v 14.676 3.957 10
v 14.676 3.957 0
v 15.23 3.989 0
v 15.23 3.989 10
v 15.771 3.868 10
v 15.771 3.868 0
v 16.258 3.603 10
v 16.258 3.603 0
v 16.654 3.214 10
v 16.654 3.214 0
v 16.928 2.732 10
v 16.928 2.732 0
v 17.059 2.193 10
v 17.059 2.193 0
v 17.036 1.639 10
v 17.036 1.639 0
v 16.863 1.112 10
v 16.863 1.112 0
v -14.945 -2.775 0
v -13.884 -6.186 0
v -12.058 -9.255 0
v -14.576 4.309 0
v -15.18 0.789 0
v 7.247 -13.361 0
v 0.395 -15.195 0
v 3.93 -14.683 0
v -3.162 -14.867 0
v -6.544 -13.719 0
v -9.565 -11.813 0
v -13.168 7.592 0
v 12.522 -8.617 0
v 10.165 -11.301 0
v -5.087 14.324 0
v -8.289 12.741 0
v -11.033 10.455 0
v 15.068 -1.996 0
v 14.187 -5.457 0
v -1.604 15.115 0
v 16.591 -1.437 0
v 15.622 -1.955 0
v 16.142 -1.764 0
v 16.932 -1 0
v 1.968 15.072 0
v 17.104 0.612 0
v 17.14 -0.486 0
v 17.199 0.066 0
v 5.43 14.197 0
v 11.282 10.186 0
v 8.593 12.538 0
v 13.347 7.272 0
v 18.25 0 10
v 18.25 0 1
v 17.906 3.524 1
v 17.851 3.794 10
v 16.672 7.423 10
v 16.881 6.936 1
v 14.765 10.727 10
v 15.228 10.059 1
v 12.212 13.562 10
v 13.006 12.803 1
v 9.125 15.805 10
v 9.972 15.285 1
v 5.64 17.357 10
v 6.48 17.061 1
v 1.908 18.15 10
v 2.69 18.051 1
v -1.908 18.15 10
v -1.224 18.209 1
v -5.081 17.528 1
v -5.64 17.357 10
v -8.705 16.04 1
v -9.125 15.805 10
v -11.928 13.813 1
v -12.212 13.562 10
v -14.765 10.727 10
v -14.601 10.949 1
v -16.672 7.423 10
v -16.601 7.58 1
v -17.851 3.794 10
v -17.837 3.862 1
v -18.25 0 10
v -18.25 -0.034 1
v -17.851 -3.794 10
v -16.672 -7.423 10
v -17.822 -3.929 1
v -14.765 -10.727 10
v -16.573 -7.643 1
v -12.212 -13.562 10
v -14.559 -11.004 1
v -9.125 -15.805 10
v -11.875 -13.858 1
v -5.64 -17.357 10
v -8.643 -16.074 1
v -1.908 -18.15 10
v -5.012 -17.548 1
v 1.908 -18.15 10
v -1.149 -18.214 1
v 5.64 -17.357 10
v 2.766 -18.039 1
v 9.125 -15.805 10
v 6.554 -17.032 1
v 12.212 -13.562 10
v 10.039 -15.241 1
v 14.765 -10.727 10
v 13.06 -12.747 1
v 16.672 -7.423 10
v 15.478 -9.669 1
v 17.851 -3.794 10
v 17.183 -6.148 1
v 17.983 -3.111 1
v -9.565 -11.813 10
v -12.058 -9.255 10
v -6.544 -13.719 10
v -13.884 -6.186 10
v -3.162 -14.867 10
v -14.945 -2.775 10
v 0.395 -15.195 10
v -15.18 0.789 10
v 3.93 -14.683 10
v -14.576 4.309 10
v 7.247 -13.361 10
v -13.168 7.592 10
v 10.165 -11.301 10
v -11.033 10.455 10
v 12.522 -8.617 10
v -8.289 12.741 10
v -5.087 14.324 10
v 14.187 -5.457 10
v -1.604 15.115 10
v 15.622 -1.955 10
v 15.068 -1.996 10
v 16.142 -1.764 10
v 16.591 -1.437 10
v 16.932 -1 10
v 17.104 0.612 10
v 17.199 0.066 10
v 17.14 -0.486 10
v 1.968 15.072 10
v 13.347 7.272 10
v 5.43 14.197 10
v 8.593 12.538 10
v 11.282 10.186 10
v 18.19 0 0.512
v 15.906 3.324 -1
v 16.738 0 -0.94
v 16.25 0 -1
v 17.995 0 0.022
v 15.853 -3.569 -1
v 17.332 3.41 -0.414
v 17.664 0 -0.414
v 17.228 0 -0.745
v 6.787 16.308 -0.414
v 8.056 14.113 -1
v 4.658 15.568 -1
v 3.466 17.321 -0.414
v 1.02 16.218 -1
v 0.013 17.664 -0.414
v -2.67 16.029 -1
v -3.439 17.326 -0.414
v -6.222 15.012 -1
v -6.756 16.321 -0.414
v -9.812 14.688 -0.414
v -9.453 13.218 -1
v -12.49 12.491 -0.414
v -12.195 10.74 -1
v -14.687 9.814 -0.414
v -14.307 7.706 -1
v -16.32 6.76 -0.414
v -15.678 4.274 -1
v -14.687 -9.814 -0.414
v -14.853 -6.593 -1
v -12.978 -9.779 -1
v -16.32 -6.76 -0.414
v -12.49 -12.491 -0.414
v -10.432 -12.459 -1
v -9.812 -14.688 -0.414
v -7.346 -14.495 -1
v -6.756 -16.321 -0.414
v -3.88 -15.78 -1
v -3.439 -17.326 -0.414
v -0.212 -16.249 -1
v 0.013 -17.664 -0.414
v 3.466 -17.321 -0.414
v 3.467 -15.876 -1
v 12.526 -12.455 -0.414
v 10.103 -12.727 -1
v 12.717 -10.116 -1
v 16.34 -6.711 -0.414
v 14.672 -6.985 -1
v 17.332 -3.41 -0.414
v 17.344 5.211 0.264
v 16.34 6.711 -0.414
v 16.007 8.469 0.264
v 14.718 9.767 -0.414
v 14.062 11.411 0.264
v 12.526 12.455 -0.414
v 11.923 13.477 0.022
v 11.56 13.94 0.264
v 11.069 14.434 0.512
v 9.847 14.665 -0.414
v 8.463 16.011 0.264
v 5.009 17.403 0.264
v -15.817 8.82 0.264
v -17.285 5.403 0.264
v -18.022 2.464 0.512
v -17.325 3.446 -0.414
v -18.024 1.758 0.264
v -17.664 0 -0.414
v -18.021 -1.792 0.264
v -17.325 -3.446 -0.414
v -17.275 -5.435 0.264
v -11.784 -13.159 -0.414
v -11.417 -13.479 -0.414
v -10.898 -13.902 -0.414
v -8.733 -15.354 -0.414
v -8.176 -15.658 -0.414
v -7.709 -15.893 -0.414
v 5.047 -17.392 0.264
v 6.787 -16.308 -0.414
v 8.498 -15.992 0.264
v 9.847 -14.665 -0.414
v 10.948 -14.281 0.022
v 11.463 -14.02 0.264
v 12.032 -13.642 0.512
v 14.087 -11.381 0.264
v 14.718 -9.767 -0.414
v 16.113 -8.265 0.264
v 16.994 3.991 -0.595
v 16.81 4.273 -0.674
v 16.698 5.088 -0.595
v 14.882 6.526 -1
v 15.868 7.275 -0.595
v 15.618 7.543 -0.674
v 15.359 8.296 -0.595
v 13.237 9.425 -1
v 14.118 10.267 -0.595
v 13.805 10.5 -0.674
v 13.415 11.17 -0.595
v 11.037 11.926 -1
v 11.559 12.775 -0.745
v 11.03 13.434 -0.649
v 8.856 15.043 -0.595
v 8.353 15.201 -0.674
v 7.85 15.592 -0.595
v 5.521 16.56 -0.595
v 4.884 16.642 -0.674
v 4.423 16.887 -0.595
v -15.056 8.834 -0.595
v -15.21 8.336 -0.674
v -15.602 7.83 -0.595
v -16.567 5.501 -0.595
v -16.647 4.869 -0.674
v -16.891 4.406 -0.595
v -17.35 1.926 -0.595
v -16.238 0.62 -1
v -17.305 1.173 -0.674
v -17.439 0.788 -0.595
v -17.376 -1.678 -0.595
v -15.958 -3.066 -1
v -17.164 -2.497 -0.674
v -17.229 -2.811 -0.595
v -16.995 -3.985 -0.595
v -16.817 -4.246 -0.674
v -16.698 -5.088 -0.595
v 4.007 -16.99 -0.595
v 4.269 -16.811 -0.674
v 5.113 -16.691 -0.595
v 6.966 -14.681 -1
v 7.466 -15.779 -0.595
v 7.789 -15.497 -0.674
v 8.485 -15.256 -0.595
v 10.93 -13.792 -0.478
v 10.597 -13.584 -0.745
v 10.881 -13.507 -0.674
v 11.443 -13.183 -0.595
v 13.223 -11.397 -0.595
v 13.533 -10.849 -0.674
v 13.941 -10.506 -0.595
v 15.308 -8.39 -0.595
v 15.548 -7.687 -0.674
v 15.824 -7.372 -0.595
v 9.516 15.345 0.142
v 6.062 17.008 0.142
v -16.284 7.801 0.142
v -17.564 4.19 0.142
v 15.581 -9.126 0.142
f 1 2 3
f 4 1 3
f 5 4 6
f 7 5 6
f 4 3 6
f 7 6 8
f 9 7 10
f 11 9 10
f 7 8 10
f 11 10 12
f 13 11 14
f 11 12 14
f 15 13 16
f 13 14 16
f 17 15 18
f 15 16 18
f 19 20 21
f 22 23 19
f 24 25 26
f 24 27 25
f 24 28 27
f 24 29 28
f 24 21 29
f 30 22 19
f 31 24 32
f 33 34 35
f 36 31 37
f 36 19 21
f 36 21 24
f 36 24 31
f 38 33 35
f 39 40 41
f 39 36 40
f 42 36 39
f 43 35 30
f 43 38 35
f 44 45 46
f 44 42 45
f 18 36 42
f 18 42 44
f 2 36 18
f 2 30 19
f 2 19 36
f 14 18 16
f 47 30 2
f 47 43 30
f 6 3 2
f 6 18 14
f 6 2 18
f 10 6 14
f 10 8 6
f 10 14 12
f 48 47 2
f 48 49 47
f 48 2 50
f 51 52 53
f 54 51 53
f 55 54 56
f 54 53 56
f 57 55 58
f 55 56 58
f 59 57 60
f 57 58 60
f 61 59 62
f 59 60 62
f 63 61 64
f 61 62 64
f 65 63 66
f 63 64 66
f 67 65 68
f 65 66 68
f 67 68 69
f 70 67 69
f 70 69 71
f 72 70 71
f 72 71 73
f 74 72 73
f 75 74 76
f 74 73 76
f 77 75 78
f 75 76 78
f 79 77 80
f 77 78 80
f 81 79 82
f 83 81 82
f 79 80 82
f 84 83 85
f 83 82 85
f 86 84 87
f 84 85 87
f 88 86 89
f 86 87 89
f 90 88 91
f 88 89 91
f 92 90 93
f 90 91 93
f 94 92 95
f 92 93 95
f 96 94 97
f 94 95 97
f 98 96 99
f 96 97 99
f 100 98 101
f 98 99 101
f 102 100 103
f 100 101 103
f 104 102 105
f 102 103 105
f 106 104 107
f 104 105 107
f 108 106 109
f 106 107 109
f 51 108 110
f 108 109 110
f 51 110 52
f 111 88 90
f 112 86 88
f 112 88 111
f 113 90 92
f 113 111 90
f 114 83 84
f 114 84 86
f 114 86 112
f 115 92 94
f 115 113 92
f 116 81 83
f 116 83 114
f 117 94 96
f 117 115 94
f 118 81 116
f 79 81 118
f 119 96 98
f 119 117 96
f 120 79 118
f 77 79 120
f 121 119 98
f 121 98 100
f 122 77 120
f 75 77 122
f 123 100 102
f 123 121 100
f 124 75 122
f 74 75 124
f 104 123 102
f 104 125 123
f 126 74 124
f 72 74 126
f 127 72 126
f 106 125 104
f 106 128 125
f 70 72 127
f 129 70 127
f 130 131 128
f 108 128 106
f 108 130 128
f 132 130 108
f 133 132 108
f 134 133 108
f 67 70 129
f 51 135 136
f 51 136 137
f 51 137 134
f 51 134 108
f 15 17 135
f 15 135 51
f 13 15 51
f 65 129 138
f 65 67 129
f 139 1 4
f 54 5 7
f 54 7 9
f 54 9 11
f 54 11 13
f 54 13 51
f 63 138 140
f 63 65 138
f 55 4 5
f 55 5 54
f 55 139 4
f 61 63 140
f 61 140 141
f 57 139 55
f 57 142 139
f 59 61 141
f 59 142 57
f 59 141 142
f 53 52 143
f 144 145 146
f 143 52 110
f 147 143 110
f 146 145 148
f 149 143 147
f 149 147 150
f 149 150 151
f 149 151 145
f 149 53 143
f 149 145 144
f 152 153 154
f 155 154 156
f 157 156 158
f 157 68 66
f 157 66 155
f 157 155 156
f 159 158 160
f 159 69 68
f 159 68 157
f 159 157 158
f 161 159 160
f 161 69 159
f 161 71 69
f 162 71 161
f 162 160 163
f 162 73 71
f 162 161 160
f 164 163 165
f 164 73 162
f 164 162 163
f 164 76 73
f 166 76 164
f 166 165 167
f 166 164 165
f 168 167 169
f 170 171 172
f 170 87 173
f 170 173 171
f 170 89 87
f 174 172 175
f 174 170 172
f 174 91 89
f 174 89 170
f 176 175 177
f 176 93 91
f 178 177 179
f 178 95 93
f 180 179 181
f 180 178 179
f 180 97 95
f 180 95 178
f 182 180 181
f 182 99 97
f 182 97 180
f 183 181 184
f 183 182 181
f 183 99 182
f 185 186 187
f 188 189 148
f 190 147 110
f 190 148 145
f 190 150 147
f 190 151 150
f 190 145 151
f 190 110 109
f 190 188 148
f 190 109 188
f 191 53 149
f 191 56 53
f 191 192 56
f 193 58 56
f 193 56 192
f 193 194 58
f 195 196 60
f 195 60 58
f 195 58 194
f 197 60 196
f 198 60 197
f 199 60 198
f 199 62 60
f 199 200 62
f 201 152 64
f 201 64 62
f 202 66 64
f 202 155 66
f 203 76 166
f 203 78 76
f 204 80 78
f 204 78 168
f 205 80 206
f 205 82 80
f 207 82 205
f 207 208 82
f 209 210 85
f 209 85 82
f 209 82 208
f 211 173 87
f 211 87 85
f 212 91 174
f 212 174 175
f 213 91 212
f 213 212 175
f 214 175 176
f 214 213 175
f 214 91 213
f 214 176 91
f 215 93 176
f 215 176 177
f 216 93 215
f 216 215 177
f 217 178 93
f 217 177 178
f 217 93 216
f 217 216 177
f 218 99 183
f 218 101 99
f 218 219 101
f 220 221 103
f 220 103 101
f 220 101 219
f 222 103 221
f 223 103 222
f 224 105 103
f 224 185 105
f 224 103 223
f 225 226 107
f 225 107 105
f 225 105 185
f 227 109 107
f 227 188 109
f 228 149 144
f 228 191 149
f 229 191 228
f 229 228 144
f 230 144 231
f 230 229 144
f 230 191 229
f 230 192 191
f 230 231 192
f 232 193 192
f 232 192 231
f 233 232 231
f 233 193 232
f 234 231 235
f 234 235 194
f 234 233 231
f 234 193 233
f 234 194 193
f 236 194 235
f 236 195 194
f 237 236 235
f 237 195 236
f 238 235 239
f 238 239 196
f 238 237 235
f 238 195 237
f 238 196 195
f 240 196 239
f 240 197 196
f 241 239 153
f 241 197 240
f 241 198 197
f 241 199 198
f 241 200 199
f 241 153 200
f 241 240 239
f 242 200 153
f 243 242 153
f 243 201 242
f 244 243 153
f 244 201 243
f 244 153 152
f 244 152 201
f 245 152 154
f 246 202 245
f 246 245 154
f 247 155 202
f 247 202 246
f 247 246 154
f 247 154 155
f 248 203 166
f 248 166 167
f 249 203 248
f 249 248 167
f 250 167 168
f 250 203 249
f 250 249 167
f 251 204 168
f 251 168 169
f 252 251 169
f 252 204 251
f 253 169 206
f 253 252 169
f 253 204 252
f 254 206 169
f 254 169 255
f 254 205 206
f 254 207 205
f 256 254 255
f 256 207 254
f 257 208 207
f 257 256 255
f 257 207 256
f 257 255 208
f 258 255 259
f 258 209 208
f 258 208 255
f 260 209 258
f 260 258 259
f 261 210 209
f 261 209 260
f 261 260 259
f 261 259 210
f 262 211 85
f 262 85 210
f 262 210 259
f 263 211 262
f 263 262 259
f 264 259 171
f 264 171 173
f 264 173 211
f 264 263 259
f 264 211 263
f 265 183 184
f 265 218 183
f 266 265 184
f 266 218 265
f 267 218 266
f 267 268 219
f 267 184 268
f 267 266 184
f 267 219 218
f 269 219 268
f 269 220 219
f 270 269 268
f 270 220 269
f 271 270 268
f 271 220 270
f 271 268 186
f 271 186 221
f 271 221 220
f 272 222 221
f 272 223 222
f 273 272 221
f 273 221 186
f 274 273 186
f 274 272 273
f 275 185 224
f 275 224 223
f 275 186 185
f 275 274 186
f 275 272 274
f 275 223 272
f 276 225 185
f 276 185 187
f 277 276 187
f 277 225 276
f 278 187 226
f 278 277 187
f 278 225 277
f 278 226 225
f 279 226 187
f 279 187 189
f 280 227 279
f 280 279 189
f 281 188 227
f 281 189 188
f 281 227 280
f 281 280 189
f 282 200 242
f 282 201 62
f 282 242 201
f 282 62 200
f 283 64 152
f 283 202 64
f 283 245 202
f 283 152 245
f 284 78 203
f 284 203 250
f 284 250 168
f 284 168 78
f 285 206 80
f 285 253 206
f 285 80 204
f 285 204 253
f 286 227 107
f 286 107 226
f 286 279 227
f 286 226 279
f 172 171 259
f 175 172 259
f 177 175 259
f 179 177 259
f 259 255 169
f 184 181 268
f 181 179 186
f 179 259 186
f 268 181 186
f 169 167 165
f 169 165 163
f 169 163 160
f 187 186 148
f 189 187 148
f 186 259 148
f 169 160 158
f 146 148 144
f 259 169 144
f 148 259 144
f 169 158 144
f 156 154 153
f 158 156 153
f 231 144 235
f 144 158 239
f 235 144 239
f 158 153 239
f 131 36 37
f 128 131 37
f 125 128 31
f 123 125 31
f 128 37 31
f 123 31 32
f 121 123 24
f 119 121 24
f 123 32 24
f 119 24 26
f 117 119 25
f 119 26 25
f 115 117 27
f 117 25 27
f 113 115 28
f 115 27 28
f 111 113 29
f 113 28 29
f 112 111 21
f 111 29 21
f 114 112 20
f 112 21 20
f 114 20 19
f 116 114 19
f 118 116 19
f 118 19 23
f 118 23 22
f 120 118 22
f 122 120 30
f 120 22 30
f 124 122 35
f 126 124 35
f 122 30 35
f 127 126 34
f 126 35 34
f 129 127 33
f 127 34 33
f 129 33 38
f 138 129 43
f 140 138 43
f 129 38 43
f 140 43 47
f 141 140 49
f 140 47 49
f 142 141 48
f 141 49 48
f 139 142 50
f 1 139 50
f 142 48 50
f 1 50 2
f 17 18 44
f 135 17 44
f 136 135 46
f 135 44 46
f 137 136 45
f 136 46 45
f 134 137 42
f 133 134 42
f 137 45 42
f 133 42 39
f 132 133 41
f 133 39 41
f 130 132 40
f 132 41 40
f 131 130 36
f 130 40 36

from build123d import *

# Parameters (mm, degrees)
F0_R     = 18.25
F1_DEPTH = 1
F2_DEPTH = 10
F3_R     = 2


with BuildPart() as f1:
    # F0 (on Top) → F1 (new body)
    with BuildSketch(Plane.XY):
        Circle(F0_R)
        with BuildLine():
            ThreePointArc((15.0684210526, -1.9956670515), (-15.1670695917, -1), (14.6759622394, 3.9567830807))
            ThreePointArc((14.6759622394, 3.9567830807), (16.6541844606, 3.2144182213), (16.8625088904, 1.1117842368))
            ThreePointArc((16.8625088904, 1.1117842368), (16.9320508076, -1), (15.0684210526, -1.9956670515))
        make_face(mode=Mode.SUBTRACT)
        with BuildLine():
            ThreePointArc((16.8625088904, 1.1117842368), (16.6541844606, 3.2144182213), (14.6759622394, 3.9567830807))
            ThreePointArc((14.6759622394, 3.9567830807), (-15.1670695917, -1), (15.0684210526, -1.9956670515))
            ThreePointArc((15.0684210526, -1.9956670515), (16.9320508076, -1), (16.8625088904, 1.1117842368))
        make_face()
    extrude(amount=-F1_DEPTH)

    # F0 (on Top) → F2 (join)
    with BuildSketch(Plane.XY):
        Circle(F0_R)
        with BuildLine():
            ThreePointArc((15.0684210526, -1.9956670515), (-15.1670695917, -1), (14.6759622394, 3.9567830807))
            ThreePointArc((14.6759622394, 3.9567830807), (16.6541844606, 3.2144182213), (16.8625088904, 1.1117842368))
            ThreePointArc((16.8625088904, 1.1117842368), (16.9320508076, -1), (15.0684210526, -1.9956670515))
        make_face(mode=Mode.SUBTRACT)
    extrude(amount=F2_DEPTH)

    # F3
    f3_edges = [f1.edges().sort_by_distance(p)[0] for p in [
        (-18.25, 0, -1),
    ]]
    fillet(f3_edges, radius=F3_R)


solid = f1.part
